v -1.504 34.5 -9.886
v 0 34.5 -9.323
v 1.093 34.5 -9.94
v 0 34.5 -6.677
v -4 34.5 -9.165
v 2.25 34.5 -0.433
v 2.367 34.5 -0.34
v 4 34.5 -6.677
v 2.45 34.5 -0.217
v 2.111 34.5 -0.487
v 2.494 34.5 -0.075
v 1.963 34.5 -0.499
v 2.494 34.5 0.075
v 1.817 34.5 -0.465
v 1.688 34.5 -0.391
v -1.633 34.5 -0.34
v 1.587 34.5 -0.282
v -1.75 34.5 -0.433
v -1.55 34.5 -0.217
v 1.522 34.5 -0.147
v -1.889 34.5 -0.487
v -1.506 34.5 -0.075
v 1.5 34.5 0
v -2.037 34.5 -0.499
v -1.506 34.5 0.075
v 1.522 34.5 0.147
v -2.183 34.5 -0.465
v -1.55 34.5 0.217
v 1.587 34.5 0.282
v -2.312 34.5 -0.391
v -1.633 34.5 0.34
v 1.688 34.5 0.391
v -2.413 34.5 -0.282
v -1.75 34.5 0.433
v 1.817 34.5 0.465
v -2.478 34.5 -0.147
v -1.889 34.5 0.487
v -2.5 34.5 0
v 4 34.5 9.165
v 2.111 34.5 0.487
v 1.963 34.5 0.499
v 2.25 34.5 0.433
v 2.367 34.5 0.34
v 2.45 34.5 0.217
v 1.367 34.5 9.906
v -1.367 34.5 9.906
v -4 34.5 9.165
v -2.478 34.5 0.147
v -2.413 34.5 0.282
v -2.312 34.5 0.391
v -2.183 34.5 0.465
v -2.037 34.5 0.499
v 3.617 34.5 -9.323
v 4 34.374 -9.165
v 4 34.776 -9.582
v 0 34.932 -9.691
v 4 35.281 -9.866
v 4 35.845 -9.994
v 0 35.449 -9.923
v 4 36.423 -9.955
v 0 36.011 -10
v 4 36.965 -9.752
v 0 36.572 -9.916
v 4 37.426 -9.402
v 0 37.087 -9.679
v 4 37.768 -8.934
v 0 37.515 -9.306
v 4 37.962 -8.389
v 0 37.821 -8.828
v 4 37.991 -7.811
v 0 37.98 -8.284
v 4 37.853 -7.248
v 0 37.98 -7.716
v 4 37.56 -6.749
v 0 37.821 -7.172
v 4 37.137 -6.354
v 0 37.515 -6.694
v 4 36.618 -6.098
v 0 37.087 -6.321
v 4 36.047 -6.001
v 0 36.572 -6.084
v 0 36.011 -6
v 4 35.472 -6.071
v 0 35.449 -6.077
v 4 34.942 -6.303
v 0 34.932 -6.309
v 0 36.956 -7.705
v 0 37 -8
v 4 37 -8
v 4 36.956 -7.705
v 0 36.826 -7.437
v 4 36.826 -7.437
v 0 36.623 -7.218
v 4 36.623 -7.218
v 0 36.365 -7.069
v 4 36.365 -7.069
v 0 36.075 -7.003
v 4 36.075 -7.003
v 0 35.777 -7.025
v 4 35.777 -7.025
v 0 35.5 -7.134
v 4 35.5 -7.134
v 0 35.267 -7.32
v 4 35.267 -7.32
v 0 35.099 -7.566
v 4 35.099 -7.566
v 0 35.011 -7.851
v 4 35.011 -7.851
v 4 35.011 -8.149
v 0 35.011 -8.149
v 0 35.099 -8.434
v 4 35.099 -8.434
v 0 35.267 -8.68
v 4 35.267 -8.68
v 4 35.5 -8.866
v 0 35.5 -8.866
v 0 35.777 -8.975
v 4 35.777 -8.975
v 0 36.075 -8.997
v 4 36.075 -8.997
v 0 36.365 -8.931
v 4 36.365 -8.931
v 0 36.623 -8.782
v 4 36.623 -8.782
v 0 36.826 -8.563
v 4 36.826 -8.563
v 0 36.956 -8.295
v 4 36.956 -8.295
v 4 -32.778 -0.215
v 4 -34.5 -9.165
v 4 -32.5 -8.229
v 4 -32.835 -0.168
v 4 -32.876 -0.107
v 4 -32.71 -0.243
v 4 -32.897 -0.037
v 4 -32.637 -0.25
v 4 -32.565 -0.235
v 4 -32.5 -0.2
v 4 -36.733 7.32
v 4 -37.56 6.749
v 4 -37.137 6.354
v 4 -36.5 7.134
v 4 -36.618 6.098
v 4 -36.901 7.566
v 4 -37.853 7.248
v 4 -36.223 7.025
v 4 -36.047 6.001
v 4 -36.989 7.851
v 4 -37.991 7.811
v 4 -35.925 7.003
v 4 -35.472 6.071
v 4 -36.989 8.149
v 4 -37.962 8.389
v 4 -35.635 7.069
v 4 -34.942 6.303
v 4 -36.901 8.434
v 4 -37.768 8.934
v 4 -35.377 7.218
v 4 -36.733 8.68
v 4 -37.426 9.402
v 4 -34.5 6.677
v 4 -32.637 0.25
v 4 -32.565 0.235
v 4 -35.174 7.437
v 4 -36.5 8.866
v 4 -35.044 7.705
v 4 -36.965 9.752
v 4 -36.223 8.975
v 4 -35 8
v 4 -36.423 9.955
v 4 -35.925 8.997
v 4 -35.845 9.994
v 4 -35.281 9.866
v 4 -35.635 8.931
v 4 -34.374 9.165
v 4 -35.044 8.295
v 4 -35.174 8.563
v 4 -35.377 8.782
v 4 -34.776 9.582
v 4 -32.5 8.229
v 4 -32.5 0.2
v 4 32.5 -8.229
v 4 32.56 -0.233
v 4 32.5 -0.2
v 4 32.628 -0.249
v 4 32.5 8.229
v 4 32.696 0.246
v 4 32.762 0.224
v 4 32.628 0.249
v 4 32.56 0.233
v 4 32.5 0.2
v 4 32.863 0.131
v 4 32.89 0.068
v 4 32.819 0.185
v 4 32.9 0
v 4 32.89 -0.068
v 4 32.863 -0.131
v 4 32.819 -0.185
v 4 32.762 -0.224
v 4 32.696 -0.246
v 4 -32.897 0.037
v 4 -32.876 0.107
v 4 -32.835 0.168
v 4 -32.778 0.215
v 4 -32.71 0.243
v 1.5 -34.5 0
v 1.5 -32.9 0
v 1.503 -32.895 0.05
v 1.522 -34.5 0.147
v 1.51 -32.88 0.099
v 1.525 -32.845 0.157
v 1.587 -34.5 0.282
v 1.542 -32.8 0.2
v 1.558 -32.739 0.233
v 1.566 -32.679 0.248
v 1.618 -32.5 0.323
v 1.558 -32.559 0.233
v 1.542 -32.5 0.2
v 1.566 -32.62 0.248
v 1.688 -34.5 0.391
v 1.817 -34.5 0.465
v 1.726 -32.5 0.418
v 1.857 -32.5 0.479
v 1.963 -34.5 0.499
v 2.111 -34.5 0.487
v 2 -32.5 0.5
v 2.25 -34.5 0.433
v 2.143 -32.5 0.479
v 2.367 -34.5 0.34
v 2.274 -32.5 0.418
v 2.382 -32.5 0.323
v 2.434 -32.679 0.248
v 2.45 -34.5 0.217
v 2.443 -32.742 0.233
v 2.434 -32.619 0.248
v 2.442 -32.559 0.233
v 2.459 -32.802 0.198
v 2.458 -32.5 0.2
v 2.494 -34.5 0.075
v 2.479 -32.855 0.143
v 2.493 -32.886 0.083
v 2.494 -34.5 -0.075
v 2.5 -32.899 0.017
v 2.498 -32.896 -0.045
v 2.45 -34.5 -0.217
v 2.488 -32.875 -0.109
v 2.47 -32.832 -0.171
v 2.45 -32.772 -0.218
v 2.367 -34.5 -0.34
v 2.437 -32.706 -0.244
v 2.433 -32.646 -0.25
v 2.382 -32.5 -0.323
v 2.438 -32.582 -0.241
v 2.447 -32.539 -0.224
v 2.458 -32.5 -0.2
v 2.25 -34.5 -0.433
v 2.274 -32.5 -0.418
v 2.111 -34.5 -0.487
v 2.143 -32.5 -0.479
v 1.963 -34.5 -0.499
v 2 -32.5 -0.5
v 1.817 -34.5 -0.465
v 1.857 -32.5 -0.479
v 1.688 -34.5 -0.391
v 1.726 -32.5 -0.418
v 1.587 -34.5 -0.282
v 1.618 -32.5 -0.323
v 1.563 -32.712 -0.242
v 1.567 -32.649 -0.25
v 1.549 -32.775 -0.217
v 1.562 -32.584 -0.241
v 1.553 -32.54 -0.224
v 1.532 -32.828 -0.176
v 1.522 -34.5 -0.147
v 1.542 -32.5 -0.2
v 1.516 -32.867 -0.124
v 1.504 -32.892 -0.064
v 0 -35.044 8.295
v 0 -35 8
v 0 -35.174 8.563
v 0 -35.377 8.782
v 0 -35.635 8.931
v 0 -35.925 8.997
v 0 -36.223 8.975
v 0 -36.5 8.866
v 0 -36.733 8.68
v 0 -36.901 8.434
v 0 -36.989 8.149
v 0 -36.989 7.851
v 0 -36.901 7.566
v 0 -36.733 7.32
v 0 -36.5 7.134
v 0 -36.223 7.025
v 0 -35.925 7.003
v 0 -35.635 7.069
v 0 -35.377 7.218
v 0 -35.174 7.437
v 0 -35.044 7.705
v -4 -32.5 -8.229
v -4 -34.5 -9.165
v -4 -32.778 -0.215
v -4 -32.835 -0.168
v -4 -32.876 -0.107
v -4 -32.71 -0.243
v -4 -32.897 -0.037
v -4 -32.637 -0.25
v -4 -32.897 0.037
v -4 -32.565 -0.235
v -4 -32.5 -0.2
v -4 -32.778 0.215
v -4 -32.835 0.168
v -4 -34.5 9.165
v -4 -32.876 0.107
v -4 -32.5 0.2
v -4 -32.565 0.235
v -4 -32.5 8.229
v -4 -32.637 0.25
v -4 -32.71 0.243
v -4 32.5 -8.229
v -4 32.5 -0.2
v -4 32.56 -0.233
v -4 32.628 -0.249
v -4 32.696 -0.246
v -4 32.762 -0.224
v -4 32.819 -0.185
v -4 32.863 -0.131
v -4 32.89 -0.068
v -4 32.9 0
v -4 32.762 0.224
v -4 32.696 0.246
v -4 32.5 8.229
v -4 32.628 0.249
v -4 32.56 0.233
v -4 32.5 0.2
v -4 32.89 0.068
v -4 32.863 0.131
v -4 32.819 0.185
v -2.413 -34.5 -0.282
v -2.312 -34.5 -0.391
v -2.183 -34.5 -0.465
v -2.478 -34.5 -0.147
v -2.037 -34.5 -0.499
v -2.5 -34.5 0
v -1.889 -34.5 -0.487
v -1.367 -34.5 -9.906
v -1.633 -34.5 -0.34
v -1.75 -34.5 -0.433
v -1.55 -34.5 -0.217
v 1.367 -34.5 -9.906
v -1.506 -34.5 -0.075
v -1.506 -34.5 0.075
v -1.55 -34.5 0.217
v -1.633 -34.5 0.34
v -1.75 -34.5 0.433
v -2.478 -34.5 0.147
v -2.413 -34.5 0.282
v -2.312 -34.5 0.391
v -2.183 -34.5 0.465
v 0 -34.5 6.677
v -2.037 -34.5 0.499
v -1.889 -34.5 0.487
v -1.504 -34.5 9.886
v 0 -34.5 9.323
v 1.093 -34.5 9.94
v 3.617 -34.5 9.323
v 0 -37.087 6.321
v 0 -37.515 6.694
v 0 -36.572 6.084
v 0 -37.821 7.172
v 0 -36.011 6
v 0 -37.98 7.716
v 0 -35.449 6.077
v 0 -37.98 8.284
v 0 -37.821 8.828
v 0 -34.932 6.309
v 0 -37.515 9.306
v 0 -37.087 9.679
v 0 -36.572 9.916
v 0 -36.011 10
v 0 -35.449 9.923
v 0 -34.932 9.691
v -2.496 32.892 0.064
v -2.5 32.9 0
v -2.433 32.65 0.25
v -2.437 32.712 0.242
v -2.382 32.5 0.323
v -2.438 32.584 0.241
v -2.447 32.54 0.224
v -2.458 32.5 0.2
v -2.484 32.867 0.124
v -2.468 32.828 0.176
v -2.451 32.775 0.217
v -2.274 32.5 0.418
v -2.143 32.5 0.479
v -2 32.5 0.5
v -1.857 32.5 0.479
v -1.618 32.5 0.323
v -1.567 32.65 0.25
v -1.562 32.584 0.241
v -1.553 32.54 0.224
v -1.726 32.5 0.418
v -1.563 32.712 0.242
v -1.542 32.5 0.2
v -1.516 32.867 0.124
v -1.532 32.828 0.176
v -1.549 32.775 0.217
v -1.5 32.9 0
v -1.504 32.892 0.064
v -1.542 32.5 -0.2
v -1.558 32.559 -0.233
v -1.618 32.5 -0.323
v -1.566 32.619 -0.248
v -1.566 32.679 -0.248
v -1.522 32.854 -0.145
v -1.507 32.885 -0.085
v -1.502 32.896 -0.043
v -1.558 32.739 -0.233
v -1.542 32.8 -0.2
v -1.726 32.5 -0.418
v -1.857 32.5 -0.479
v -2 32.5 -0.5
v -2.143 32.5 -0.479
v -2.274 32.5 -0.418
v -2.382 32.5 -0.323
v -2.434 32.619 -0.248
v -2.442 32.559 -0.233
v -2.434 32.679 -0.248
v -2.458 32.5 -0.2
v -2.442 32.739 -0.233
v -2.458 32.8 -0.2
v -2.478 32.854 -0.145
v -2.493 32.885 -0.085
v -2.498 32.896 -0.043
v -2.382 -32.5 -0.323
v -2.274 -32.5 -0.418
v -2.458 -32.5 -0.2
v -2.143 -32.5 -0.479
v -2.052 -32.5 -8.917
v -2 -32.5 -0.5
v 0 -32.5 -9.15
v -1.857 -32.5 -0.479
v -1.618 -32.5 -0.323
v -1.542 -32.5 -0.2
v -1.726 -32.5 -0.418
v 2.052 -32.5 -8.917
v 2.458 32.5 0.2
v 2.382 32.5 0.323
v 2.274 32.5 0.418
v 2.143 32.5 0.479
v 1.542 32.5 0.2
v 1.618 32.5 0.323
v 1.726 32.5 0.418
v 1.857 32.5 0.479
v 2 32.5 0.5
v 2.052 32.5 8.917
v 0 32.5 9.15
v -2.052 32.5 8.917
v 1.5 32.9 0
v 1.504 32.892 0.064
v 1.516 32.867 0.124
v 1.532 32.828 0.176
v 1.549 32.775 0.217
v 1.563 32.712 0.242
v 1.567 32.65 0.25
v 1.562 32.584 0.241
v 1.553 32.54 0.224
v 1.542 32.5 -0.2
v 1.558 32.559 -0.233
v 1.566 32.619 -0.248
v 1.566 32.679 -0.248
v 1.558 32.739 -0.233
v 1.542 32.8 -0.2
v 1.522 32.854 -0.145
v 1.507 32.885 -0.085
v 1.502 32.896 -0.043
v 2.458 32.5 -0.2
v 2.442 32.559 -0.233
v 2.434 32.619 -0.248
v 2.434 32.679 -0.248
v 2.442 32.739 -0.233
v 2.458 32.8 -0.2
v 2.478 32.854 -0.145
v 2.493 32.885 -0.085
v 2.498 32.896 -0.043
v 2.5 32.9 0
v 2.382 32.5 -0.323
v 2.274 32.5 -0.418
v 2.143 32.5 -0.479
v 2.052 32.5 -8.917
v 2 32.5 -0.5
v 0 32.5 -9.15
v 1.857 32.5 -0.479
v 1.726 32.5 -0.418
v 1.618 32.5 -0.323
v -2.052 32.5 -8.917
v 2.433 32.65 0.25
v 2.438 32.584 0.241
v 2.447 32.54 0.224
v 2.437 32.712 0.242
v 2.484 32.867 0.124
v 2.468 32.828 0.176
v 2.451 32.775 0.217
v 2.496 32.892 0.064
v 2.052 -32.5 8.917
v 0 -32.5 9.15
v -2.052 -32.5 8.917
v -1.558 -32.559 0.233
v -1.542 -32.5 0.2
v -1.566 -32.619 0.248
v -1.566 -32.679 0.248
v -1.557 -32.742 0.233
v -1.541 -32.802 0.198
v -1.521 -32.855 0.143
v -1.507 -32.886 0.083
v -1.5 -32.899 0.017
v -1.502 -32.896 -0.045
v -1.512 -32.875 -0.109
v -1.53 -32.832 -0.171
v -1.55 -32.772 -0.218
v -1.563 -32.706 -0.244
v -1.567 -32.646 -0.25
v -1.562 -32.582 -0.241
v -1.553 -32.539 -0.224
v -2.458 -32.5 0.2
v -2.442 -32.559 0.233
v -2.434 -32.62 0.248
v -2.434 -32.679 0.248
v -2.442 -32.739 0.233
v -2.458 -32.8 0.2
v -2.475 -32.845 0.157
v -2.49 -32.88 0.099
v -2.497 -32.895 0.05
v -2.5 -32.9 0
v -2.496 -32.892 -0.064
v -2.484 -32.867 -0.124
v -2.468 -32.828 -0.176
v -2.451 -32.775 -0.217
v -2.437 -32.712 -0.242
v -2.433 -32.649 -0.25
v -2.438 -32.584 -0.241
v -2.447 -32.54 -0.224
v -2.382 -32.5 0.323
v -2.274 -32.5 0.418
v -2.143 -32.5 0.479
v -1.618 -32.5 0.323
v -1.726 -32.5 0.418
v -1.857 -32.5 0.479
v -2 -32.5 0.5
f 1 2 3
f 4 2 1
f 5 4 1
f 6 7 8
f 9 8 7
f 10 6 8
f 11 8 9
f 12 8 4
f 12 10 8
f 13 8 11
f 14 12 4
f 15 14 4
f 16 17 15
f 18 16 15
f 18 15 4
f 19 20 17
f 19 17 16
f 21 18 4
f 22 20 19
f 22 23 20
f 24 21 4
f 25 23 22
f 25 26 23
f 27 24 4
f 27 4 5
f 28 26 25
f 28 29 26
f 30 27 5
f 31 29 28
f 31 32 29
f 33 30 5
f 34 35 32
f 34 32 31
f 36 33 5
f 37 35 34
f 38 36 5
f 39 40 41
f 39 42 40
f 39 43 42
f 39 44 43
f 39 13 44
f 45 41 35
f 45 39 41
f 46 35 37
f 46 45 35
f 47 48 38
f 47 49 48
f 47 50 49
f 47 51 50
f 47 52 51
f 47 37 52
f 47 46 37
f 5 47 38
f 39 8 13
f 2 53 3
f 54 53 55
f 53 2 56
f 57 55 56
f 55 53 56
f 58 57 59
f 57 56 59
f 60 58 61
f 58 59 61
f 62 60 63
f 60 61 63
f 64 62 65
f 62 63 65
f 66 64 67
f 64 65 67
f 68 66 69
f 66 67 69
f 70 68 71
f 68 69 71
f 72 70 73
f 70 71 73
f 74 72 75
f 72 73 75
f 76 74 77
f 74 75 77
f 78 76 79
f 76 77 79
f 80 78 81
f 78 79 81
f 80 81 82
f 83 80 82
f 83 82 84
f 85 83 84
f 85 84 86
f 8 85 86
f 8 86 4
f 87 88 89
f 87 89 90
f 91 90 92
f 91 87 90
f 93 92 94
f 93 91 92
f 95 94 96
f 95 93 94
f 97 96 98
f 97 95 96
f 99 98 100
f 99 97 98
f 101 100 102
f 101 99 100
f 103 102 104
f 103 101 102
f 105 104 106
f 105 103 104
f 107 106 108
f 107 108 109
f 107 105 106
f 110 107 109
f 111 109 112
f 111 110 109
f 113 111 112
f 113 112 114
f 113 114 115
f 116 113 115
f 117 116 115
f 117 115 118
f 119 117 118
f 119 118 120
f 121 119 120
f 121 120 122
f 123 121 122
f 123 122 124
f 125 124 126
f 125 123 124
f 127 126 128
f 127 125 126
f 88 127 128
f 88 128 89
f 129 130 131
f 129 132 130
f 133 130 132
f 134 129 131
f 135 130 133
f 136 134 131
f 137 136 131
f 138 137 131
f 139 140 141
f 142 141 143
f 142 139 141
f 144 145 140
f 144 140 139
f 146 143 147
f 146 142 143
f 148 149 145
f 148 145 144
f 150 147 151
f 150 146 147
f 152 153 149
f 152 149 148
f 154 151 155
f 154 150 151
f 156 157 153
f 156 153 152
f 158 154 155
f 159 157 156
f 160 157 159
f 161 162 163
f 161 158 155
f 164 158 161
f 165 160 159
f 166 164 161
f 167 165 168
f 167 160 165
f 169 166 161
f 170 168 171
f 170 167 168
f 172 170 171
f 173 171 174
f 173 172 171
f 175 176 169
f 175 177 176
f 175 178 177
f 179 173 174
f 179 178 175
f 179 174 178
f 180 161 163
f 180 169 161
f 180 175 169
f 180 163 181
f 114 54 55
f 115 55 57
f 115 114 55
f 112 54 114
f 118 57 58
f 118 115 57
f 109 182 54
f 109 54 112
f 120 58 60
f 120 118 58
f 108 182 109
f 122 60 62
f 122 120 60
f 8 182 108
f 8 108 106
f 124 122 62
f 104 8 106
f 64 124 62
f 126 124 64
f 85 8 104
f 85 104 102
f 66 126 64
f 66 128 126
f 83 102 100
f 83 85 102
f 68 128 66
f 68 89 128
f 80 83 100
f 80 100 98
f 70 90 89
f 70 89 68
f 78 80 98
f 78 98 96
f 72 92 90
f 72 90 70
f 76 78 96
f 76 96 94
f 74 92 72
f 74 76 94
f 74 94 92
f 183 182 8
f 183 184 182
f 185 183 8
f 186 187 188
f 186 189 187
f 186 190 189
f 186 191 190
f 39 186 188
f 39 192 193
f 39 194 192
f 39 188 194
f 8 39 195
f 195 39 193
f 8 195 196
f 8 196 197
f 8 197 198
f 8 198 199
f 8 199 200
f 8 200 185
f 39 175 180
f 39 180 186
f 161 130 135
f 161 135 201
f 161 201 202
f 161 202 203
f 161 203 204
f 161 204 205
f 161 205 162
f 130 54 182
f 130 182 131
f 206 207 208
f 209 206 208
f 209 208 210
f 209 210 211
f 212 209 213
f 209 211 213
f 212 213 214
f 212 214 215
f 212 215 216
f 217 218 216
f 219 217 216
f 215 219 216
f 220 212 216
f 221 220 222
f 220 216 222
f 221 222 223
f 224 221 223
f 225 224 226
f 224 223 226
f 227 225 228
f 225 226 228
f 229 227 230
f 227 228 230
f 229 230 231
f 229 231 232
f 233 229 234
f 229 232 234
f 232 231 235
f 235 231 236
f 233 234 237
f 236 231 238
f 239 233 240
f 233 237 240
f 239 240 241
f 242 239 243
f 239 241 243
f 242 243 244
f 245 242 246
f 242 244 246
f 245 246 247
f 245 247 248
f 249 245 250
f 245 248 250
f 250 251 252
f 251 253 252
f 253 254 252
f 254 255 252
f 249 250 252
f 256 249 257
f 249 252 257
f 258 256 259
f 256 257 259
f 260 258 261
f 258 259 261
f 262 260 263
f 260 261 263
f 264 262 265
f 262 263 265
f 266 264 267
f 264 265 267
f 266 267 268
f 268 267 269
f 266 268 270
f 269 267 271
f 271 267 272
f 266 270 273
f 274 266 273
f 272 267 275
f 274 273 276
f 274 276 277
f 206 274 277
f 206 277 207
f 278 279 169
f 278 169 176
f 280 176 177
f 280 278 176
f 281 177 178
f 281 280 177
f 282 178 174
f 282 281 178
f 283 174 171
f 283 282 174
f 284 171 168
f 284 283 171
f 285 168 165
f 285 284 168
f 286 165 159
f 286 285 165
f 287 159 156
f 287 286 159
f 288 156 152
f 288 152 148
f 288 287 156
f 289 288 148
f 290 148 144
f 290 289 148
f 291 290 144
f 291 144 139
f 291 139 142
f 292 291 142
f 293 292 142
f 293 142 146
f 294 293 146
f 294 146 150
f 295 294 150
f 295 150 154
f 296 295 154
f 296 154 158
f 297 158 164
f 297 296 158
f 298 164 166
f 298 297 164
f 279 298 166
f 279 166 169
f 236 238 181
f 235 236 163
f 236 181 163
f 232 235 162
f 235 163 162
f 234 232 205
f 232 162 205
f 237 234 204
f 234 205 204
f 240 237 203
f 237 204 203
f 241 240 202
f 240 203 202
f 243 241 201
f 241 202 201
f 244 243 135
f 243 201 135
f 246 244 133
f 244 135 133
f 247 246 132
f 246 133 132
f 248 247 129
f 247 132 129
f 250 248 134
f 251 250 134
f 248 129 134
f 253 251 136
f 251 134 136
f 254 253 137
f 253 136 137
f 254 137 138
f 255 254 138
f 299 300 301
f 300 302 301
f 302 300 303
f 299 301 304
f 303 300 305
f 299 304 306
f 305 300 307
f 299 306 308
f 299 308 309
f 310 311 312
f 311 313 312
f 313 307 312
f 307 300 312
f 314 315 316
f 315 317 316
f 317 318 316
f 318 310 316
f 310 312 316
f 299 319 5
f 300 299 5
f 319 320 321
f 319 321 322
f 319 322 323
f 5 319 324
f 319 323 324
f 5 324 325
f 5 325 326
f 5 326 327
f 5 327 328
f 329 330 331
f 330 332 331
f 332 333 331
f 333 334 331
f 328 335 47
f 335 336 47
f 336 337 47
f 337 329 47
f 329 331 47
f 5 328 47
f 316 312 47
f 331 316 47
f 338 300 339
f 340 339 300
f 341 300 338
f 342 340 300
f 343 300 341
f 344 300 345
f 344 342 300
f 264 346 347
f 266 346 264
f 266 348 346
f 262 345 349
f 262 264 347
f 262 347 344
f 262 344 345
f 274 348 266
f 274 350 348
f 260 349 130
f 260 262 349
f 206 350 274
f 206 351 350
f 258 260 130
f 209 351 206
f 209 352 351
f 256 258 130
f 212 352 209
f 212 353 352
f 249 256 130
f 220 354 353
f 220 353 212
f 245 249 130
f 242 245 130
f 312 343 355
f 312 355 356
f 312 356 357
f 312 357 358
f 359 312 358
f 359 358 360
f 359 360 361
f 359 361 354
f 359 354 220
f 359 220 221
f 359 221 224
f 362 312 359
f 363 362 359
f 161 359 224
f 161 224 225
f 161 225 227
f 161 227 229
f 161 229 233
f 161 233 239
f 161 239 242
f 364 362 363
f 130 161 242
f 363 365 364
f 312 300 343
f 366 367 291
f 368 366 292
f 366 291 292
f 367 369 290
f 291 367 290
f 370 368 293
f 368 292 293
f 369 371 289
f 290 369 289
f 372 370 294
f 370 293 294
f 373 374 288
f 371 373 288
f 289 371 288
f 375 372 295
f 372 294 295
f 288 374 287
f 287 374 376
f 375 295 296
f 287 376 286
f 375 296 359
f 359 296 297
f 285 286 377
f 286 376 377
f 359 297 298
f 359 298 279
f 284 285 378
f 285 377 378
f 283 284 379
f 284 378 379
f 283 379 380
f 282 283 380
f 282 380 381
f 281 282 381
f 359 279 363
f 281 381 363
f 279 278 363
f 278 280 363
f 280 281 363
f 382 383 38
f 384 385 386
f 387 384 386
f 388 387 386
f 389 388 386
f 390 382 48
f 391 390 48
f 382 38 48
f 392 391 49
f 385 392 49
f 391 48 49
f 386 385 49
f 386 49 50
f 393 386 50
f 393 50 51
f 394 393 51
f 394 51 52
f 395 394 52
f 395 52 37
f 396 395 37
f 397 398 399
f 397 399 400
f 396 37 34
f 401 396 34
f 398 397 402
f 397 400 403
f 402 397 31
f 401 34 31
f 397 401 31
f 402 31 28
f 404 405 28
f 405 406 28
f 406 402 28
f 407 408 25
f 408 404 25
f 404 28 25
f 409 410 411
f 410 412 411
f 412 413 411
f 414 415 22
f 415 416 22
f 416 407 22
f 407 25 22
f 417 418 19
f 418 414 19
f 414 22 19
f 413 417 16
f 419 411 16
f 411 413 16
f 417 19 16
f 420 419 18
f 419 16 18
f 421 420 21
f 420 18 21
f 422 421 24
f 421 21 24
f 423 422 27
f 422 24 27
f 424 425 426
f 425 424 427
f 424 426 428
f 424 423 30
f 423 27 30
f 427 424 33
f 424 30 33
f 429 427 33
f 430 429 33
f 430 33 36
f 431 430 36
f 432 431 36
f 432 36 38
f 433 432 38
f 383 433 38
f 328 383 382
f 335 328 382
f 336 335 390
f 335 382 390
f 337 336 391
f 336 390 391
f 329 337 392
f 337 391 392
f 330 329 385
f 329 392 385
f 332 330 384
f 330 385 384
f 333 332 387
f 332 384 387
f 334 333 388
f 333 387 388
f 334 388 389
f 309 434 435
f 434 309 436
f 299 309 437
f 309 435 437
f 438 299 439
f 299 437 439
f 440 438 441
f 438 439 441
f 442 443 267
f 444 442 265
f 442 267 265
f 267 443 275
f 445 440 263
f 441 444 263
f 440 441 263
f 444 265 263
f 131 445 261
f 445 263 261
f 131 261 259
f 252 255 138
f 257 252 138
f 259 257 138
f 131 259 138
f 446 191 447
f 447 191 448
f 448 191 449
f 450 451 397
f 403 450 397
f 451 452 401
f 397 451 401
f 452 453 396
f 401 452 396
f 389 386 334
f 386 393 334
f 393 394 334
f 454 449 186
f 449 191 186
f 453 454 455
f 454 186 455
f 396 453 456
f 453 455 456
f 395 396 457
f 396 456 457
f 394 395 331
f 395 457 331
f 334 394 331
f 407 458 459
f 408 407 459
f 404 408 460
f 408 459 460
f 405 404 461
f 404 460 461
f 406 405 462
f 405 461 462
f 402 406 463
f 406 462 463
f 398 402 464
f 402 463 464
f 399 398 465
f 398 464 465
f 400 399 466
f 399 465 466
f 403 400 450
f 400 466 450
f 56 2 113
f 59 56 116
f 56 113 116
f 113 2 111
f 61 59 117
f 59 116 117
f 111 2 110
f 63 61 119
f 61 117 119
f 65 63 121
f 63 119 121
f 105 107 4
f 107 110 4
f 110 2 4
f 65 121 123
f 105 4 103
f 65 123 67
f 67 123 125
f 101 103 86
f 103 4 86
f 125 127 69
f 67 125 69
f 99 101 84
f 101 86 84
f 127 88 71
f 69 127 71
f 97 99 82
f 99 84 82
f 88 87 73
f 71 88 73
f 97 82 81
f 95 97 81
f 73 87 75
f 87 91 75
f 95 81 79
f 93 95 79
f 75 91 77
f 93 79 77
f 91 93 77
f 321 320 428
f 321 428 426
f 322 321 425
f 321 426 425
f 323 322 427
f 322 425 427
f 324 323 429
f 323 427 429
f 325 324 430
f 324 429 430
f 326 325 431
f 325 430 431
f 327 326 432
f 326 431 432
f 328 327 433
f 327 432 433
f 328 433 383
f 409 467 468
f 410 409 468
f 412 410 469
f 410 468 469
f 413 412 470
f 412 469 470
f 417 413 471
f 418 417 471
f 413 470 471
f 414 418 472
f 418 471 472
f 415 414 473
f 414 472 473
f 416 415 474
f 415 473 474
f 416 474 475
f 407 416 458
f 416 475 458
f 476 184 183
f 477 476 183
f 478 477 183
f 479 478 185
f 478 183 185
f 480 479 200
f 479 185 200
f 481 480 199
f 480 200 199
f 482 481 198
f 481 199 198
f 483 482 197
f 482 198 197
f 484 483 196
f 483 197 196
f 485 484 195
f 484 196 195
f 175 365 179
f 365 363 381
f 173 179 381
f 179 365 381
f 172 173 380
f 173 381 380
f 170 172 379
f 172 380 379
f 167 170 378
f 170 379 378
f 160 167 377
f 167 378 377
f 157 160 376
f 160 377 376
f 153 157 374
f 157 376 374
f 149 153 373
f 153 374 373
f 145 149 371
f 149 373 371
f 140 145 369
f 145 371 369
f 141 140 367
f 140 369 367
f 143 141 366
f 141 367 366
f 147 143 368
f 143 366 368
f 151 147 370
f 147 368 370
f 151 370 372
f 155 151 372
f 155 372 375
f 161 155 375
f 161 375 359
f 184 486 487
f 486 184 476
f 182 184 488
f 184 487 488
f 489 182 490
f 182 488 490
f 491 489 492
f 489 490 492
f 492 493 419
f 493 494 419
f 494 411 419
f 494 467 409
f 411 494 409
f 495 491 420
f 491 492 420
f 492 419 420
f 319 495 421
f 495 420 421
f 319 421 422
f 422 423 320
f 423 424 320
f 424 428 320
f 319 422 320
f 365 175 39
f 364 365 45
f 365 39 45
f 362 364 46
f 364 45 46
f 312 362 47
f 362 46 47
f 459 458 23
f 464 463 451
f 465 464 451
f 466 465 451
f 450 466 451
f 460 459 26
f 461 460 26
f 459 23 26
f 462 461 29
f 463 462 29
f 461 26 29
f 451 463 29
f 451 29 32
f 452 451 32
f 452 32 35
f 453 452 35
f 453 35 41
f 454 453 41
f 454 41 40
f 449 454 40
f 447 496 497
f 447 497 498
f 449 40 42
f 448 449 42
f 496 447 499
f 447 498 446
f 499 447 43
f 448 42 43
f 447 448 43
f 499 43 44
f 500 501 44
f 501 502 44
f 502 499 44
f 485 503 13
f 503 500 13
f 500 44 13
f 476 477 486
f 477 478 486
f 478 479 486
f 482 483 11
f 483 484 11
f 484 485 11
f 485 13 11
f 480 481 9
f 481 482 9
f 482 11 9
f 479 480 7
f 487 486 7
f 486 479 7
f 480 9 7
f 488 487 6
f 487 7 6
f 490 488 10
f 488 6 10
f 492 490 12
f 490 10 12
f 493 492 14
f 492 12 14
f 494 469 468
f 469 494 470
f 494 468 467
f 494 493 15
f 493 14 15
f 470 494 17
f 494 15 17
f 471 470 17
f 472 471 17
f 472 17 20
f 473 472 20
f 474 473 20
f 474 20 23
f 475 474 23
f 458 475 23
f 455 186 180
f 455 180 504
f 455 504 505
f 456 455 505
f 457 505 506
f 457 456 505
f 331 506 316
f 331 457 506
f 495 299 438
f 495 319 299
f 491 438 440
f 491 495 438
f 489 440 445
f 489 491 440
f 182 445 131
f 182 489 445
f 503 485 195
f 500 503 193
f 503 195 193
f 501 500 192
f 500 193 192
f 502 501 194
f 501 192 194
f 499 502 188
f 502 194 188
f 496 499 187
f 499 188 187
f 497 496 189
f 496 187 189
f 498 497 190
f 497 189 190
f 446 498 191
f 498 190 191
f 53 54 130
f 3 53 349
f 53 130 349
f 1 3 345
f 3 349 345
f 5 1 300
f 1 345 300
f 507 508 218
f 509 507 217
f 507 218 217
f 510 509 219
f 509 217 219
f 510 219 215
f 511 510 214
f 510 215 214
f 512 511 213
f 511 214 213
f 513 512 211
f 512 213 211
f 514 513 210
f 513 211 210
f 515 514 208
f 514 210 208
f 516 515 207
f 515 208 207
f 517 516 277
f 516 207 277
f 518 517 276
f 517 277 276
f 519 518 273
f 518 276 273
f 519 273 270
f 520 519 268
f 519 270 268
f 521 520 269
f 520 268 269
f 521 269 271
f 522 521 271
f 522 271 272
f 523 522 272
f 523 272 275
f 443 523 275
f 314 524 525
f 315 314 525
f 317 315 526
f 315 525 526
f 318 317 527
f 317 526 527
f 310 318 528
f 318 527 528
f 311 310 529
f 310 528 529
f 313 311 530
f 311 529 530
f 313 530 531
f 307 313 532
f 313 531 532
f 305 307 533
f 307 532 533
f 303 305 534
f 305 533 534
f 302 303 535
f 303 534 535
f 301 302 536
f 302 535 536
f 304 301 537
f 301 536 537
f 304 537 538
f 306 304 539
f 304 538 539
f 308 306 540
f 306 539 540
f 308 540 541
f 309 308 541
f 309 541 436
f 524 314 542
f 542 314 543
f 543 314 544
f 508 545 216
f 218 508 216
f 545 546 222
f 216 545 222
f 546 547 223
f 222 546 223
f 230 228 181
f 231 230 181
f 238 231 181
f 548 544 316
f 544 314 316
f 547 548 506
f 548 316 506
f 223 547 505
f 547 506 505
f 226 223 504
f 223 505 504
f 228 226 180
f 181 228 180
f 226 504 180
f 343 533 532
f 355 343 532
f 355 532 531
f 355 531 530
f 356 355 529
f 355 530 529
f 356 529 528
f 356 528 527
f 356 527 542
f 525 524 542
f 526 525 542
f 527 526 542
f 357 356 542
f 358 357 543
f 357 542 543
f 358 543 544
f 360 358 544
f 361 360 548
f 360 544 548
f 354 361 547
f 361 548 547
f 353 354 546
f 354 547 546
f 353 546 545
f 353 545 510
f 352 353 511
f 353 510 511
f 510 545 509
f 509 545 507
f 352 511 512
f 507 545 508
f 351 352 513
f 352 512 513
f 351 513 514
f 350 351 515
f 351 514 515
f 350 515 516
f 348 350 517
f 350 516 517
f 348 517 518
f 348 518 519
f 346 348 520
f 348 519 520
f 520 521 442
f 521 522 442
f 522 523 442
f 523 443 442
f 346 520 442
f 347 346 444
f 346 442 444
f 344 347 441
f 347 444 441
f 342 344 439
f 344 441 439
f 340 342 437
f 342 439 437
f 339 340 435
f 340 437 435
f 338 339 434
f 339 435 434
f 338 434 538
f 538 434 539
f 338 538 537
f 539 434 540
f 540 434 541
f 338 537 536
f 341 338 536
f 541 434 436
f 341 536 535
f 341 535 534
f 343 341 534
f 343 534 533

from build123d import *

# Parameters (mm, degrees)
F0_R      = 10
F0_R_2    = 9.15
F1_DEPTH  = 32.5
F3_R      = 10
F4_DEPTH  = 2
F6_R      = 10
F7_DEPTH  = 2
F9_W      = 20.5420348992
F9_H      = 75
F9_W_2    = 19.674062295
F10_DEPTH = 25
F12_DEPTH = 25
F13_R     = 0.5
F14_DEPTH = 80
F15_R     = 2
F15_R_2   = 1
F16_DEPTH = 4
F17_R     = 2
F17_R_2   = 1
F18_DEPTH = 4


with BuildPart() as f1:
    # F0 (on Front) → F1 (new body, symmetric)
    with BuildSketch(Plane.XZ):
        Circle(F0_R)
        Circle(F0_R_2, mode=Mode.SUBTRACT)
    extrude(amount=F1_DEPTH, both=True)

    # F3 (on face) → F4 (join)
    with BuildSketch(Plane.XZ.offset(32.5)):
        Circle(F3_R)
    extrude(amount=F4_DEPTH)

    # F6 (on face) → F7 (join)
    with BuildSketch(Plane(origin=(0, 32.5, 0), x_dir=(-1, 0, 0), z_dir=(0, 1, 0))):
        Circle(F6_R)
    extrude(amount=F7_DEPTH)

    # F9 (on offset) → F10 (cut)
    with BuildSketch(Plane.XY.offset(11)):
        with Locations((-14.2710174496, 0)):
            Rectangle(F9_W, F9_H)
        with Locations((13.8370311475, 0)):
            Rectangle(F9_W_2, F9_H)
    extrude(amount=-F10_DEPTH, mode=Mode.SUBTRACT)

    # F11 (on face) → F12 (cut)
    with BuildSketch(Plane.YZ.offset(4)):
        with BuildLine():
            Line((-32.5, -0.2), (-32.5, 0.2))
            ThreePointArc((-32.5, 0.2), (-32.9, 0), (-32.5, -0.2))
        make_face()
        with BuildLine():
            ThreePointArc((32.9, 0), (32.7618033989, 0.2236067977), (32.5, 0.2))
            Line((32.5, 0.2), (32.5, -0.2))
            ThreePointArc((32.5, -0.2), (32.7618033989, -0.2236067977), (32.9, 0))
        make_face()
    extrude(amount=-F12_DEPTH, mode=Mode.SUBTRACT)

    # F13 (on face) → F14 (cut)
    with BuildSketch(Plane(origin=(0, 34.5, 0), x_dir=(-1, 0, 0), z_dir=(0, 1, 0))):
        with Locations((-2, 0)):
            Circle(F13_R)
        with Locations((2, 0)):
            Circle(F13_R)
    extrude(amount=-F14_DEPTH, mode=Mode.SUBTRACT)

    # F15 (on Right) → F16 (join)
    with BuildSketch(Plane.YZ):
        with Locations((36, -8)):
            Circle(F15_R)
        with Locations((36, -8)):
            Circle(F15_R_2, mode=Mode.SUBTRACT)
    extrude(amount=F16_DEPTH)

    # F17 (on Right) → F18 (join)
    with BuildSketch(Plane.YZ):
        with Locations((-36, 8)):
            Circle(F17_R)
        with Locations((-36, 8)):
            Circle(F17_R_2, mode=Mode.SUBTRACT)
    extrude(amount=F18_DEPTH)


solid = f1.part
